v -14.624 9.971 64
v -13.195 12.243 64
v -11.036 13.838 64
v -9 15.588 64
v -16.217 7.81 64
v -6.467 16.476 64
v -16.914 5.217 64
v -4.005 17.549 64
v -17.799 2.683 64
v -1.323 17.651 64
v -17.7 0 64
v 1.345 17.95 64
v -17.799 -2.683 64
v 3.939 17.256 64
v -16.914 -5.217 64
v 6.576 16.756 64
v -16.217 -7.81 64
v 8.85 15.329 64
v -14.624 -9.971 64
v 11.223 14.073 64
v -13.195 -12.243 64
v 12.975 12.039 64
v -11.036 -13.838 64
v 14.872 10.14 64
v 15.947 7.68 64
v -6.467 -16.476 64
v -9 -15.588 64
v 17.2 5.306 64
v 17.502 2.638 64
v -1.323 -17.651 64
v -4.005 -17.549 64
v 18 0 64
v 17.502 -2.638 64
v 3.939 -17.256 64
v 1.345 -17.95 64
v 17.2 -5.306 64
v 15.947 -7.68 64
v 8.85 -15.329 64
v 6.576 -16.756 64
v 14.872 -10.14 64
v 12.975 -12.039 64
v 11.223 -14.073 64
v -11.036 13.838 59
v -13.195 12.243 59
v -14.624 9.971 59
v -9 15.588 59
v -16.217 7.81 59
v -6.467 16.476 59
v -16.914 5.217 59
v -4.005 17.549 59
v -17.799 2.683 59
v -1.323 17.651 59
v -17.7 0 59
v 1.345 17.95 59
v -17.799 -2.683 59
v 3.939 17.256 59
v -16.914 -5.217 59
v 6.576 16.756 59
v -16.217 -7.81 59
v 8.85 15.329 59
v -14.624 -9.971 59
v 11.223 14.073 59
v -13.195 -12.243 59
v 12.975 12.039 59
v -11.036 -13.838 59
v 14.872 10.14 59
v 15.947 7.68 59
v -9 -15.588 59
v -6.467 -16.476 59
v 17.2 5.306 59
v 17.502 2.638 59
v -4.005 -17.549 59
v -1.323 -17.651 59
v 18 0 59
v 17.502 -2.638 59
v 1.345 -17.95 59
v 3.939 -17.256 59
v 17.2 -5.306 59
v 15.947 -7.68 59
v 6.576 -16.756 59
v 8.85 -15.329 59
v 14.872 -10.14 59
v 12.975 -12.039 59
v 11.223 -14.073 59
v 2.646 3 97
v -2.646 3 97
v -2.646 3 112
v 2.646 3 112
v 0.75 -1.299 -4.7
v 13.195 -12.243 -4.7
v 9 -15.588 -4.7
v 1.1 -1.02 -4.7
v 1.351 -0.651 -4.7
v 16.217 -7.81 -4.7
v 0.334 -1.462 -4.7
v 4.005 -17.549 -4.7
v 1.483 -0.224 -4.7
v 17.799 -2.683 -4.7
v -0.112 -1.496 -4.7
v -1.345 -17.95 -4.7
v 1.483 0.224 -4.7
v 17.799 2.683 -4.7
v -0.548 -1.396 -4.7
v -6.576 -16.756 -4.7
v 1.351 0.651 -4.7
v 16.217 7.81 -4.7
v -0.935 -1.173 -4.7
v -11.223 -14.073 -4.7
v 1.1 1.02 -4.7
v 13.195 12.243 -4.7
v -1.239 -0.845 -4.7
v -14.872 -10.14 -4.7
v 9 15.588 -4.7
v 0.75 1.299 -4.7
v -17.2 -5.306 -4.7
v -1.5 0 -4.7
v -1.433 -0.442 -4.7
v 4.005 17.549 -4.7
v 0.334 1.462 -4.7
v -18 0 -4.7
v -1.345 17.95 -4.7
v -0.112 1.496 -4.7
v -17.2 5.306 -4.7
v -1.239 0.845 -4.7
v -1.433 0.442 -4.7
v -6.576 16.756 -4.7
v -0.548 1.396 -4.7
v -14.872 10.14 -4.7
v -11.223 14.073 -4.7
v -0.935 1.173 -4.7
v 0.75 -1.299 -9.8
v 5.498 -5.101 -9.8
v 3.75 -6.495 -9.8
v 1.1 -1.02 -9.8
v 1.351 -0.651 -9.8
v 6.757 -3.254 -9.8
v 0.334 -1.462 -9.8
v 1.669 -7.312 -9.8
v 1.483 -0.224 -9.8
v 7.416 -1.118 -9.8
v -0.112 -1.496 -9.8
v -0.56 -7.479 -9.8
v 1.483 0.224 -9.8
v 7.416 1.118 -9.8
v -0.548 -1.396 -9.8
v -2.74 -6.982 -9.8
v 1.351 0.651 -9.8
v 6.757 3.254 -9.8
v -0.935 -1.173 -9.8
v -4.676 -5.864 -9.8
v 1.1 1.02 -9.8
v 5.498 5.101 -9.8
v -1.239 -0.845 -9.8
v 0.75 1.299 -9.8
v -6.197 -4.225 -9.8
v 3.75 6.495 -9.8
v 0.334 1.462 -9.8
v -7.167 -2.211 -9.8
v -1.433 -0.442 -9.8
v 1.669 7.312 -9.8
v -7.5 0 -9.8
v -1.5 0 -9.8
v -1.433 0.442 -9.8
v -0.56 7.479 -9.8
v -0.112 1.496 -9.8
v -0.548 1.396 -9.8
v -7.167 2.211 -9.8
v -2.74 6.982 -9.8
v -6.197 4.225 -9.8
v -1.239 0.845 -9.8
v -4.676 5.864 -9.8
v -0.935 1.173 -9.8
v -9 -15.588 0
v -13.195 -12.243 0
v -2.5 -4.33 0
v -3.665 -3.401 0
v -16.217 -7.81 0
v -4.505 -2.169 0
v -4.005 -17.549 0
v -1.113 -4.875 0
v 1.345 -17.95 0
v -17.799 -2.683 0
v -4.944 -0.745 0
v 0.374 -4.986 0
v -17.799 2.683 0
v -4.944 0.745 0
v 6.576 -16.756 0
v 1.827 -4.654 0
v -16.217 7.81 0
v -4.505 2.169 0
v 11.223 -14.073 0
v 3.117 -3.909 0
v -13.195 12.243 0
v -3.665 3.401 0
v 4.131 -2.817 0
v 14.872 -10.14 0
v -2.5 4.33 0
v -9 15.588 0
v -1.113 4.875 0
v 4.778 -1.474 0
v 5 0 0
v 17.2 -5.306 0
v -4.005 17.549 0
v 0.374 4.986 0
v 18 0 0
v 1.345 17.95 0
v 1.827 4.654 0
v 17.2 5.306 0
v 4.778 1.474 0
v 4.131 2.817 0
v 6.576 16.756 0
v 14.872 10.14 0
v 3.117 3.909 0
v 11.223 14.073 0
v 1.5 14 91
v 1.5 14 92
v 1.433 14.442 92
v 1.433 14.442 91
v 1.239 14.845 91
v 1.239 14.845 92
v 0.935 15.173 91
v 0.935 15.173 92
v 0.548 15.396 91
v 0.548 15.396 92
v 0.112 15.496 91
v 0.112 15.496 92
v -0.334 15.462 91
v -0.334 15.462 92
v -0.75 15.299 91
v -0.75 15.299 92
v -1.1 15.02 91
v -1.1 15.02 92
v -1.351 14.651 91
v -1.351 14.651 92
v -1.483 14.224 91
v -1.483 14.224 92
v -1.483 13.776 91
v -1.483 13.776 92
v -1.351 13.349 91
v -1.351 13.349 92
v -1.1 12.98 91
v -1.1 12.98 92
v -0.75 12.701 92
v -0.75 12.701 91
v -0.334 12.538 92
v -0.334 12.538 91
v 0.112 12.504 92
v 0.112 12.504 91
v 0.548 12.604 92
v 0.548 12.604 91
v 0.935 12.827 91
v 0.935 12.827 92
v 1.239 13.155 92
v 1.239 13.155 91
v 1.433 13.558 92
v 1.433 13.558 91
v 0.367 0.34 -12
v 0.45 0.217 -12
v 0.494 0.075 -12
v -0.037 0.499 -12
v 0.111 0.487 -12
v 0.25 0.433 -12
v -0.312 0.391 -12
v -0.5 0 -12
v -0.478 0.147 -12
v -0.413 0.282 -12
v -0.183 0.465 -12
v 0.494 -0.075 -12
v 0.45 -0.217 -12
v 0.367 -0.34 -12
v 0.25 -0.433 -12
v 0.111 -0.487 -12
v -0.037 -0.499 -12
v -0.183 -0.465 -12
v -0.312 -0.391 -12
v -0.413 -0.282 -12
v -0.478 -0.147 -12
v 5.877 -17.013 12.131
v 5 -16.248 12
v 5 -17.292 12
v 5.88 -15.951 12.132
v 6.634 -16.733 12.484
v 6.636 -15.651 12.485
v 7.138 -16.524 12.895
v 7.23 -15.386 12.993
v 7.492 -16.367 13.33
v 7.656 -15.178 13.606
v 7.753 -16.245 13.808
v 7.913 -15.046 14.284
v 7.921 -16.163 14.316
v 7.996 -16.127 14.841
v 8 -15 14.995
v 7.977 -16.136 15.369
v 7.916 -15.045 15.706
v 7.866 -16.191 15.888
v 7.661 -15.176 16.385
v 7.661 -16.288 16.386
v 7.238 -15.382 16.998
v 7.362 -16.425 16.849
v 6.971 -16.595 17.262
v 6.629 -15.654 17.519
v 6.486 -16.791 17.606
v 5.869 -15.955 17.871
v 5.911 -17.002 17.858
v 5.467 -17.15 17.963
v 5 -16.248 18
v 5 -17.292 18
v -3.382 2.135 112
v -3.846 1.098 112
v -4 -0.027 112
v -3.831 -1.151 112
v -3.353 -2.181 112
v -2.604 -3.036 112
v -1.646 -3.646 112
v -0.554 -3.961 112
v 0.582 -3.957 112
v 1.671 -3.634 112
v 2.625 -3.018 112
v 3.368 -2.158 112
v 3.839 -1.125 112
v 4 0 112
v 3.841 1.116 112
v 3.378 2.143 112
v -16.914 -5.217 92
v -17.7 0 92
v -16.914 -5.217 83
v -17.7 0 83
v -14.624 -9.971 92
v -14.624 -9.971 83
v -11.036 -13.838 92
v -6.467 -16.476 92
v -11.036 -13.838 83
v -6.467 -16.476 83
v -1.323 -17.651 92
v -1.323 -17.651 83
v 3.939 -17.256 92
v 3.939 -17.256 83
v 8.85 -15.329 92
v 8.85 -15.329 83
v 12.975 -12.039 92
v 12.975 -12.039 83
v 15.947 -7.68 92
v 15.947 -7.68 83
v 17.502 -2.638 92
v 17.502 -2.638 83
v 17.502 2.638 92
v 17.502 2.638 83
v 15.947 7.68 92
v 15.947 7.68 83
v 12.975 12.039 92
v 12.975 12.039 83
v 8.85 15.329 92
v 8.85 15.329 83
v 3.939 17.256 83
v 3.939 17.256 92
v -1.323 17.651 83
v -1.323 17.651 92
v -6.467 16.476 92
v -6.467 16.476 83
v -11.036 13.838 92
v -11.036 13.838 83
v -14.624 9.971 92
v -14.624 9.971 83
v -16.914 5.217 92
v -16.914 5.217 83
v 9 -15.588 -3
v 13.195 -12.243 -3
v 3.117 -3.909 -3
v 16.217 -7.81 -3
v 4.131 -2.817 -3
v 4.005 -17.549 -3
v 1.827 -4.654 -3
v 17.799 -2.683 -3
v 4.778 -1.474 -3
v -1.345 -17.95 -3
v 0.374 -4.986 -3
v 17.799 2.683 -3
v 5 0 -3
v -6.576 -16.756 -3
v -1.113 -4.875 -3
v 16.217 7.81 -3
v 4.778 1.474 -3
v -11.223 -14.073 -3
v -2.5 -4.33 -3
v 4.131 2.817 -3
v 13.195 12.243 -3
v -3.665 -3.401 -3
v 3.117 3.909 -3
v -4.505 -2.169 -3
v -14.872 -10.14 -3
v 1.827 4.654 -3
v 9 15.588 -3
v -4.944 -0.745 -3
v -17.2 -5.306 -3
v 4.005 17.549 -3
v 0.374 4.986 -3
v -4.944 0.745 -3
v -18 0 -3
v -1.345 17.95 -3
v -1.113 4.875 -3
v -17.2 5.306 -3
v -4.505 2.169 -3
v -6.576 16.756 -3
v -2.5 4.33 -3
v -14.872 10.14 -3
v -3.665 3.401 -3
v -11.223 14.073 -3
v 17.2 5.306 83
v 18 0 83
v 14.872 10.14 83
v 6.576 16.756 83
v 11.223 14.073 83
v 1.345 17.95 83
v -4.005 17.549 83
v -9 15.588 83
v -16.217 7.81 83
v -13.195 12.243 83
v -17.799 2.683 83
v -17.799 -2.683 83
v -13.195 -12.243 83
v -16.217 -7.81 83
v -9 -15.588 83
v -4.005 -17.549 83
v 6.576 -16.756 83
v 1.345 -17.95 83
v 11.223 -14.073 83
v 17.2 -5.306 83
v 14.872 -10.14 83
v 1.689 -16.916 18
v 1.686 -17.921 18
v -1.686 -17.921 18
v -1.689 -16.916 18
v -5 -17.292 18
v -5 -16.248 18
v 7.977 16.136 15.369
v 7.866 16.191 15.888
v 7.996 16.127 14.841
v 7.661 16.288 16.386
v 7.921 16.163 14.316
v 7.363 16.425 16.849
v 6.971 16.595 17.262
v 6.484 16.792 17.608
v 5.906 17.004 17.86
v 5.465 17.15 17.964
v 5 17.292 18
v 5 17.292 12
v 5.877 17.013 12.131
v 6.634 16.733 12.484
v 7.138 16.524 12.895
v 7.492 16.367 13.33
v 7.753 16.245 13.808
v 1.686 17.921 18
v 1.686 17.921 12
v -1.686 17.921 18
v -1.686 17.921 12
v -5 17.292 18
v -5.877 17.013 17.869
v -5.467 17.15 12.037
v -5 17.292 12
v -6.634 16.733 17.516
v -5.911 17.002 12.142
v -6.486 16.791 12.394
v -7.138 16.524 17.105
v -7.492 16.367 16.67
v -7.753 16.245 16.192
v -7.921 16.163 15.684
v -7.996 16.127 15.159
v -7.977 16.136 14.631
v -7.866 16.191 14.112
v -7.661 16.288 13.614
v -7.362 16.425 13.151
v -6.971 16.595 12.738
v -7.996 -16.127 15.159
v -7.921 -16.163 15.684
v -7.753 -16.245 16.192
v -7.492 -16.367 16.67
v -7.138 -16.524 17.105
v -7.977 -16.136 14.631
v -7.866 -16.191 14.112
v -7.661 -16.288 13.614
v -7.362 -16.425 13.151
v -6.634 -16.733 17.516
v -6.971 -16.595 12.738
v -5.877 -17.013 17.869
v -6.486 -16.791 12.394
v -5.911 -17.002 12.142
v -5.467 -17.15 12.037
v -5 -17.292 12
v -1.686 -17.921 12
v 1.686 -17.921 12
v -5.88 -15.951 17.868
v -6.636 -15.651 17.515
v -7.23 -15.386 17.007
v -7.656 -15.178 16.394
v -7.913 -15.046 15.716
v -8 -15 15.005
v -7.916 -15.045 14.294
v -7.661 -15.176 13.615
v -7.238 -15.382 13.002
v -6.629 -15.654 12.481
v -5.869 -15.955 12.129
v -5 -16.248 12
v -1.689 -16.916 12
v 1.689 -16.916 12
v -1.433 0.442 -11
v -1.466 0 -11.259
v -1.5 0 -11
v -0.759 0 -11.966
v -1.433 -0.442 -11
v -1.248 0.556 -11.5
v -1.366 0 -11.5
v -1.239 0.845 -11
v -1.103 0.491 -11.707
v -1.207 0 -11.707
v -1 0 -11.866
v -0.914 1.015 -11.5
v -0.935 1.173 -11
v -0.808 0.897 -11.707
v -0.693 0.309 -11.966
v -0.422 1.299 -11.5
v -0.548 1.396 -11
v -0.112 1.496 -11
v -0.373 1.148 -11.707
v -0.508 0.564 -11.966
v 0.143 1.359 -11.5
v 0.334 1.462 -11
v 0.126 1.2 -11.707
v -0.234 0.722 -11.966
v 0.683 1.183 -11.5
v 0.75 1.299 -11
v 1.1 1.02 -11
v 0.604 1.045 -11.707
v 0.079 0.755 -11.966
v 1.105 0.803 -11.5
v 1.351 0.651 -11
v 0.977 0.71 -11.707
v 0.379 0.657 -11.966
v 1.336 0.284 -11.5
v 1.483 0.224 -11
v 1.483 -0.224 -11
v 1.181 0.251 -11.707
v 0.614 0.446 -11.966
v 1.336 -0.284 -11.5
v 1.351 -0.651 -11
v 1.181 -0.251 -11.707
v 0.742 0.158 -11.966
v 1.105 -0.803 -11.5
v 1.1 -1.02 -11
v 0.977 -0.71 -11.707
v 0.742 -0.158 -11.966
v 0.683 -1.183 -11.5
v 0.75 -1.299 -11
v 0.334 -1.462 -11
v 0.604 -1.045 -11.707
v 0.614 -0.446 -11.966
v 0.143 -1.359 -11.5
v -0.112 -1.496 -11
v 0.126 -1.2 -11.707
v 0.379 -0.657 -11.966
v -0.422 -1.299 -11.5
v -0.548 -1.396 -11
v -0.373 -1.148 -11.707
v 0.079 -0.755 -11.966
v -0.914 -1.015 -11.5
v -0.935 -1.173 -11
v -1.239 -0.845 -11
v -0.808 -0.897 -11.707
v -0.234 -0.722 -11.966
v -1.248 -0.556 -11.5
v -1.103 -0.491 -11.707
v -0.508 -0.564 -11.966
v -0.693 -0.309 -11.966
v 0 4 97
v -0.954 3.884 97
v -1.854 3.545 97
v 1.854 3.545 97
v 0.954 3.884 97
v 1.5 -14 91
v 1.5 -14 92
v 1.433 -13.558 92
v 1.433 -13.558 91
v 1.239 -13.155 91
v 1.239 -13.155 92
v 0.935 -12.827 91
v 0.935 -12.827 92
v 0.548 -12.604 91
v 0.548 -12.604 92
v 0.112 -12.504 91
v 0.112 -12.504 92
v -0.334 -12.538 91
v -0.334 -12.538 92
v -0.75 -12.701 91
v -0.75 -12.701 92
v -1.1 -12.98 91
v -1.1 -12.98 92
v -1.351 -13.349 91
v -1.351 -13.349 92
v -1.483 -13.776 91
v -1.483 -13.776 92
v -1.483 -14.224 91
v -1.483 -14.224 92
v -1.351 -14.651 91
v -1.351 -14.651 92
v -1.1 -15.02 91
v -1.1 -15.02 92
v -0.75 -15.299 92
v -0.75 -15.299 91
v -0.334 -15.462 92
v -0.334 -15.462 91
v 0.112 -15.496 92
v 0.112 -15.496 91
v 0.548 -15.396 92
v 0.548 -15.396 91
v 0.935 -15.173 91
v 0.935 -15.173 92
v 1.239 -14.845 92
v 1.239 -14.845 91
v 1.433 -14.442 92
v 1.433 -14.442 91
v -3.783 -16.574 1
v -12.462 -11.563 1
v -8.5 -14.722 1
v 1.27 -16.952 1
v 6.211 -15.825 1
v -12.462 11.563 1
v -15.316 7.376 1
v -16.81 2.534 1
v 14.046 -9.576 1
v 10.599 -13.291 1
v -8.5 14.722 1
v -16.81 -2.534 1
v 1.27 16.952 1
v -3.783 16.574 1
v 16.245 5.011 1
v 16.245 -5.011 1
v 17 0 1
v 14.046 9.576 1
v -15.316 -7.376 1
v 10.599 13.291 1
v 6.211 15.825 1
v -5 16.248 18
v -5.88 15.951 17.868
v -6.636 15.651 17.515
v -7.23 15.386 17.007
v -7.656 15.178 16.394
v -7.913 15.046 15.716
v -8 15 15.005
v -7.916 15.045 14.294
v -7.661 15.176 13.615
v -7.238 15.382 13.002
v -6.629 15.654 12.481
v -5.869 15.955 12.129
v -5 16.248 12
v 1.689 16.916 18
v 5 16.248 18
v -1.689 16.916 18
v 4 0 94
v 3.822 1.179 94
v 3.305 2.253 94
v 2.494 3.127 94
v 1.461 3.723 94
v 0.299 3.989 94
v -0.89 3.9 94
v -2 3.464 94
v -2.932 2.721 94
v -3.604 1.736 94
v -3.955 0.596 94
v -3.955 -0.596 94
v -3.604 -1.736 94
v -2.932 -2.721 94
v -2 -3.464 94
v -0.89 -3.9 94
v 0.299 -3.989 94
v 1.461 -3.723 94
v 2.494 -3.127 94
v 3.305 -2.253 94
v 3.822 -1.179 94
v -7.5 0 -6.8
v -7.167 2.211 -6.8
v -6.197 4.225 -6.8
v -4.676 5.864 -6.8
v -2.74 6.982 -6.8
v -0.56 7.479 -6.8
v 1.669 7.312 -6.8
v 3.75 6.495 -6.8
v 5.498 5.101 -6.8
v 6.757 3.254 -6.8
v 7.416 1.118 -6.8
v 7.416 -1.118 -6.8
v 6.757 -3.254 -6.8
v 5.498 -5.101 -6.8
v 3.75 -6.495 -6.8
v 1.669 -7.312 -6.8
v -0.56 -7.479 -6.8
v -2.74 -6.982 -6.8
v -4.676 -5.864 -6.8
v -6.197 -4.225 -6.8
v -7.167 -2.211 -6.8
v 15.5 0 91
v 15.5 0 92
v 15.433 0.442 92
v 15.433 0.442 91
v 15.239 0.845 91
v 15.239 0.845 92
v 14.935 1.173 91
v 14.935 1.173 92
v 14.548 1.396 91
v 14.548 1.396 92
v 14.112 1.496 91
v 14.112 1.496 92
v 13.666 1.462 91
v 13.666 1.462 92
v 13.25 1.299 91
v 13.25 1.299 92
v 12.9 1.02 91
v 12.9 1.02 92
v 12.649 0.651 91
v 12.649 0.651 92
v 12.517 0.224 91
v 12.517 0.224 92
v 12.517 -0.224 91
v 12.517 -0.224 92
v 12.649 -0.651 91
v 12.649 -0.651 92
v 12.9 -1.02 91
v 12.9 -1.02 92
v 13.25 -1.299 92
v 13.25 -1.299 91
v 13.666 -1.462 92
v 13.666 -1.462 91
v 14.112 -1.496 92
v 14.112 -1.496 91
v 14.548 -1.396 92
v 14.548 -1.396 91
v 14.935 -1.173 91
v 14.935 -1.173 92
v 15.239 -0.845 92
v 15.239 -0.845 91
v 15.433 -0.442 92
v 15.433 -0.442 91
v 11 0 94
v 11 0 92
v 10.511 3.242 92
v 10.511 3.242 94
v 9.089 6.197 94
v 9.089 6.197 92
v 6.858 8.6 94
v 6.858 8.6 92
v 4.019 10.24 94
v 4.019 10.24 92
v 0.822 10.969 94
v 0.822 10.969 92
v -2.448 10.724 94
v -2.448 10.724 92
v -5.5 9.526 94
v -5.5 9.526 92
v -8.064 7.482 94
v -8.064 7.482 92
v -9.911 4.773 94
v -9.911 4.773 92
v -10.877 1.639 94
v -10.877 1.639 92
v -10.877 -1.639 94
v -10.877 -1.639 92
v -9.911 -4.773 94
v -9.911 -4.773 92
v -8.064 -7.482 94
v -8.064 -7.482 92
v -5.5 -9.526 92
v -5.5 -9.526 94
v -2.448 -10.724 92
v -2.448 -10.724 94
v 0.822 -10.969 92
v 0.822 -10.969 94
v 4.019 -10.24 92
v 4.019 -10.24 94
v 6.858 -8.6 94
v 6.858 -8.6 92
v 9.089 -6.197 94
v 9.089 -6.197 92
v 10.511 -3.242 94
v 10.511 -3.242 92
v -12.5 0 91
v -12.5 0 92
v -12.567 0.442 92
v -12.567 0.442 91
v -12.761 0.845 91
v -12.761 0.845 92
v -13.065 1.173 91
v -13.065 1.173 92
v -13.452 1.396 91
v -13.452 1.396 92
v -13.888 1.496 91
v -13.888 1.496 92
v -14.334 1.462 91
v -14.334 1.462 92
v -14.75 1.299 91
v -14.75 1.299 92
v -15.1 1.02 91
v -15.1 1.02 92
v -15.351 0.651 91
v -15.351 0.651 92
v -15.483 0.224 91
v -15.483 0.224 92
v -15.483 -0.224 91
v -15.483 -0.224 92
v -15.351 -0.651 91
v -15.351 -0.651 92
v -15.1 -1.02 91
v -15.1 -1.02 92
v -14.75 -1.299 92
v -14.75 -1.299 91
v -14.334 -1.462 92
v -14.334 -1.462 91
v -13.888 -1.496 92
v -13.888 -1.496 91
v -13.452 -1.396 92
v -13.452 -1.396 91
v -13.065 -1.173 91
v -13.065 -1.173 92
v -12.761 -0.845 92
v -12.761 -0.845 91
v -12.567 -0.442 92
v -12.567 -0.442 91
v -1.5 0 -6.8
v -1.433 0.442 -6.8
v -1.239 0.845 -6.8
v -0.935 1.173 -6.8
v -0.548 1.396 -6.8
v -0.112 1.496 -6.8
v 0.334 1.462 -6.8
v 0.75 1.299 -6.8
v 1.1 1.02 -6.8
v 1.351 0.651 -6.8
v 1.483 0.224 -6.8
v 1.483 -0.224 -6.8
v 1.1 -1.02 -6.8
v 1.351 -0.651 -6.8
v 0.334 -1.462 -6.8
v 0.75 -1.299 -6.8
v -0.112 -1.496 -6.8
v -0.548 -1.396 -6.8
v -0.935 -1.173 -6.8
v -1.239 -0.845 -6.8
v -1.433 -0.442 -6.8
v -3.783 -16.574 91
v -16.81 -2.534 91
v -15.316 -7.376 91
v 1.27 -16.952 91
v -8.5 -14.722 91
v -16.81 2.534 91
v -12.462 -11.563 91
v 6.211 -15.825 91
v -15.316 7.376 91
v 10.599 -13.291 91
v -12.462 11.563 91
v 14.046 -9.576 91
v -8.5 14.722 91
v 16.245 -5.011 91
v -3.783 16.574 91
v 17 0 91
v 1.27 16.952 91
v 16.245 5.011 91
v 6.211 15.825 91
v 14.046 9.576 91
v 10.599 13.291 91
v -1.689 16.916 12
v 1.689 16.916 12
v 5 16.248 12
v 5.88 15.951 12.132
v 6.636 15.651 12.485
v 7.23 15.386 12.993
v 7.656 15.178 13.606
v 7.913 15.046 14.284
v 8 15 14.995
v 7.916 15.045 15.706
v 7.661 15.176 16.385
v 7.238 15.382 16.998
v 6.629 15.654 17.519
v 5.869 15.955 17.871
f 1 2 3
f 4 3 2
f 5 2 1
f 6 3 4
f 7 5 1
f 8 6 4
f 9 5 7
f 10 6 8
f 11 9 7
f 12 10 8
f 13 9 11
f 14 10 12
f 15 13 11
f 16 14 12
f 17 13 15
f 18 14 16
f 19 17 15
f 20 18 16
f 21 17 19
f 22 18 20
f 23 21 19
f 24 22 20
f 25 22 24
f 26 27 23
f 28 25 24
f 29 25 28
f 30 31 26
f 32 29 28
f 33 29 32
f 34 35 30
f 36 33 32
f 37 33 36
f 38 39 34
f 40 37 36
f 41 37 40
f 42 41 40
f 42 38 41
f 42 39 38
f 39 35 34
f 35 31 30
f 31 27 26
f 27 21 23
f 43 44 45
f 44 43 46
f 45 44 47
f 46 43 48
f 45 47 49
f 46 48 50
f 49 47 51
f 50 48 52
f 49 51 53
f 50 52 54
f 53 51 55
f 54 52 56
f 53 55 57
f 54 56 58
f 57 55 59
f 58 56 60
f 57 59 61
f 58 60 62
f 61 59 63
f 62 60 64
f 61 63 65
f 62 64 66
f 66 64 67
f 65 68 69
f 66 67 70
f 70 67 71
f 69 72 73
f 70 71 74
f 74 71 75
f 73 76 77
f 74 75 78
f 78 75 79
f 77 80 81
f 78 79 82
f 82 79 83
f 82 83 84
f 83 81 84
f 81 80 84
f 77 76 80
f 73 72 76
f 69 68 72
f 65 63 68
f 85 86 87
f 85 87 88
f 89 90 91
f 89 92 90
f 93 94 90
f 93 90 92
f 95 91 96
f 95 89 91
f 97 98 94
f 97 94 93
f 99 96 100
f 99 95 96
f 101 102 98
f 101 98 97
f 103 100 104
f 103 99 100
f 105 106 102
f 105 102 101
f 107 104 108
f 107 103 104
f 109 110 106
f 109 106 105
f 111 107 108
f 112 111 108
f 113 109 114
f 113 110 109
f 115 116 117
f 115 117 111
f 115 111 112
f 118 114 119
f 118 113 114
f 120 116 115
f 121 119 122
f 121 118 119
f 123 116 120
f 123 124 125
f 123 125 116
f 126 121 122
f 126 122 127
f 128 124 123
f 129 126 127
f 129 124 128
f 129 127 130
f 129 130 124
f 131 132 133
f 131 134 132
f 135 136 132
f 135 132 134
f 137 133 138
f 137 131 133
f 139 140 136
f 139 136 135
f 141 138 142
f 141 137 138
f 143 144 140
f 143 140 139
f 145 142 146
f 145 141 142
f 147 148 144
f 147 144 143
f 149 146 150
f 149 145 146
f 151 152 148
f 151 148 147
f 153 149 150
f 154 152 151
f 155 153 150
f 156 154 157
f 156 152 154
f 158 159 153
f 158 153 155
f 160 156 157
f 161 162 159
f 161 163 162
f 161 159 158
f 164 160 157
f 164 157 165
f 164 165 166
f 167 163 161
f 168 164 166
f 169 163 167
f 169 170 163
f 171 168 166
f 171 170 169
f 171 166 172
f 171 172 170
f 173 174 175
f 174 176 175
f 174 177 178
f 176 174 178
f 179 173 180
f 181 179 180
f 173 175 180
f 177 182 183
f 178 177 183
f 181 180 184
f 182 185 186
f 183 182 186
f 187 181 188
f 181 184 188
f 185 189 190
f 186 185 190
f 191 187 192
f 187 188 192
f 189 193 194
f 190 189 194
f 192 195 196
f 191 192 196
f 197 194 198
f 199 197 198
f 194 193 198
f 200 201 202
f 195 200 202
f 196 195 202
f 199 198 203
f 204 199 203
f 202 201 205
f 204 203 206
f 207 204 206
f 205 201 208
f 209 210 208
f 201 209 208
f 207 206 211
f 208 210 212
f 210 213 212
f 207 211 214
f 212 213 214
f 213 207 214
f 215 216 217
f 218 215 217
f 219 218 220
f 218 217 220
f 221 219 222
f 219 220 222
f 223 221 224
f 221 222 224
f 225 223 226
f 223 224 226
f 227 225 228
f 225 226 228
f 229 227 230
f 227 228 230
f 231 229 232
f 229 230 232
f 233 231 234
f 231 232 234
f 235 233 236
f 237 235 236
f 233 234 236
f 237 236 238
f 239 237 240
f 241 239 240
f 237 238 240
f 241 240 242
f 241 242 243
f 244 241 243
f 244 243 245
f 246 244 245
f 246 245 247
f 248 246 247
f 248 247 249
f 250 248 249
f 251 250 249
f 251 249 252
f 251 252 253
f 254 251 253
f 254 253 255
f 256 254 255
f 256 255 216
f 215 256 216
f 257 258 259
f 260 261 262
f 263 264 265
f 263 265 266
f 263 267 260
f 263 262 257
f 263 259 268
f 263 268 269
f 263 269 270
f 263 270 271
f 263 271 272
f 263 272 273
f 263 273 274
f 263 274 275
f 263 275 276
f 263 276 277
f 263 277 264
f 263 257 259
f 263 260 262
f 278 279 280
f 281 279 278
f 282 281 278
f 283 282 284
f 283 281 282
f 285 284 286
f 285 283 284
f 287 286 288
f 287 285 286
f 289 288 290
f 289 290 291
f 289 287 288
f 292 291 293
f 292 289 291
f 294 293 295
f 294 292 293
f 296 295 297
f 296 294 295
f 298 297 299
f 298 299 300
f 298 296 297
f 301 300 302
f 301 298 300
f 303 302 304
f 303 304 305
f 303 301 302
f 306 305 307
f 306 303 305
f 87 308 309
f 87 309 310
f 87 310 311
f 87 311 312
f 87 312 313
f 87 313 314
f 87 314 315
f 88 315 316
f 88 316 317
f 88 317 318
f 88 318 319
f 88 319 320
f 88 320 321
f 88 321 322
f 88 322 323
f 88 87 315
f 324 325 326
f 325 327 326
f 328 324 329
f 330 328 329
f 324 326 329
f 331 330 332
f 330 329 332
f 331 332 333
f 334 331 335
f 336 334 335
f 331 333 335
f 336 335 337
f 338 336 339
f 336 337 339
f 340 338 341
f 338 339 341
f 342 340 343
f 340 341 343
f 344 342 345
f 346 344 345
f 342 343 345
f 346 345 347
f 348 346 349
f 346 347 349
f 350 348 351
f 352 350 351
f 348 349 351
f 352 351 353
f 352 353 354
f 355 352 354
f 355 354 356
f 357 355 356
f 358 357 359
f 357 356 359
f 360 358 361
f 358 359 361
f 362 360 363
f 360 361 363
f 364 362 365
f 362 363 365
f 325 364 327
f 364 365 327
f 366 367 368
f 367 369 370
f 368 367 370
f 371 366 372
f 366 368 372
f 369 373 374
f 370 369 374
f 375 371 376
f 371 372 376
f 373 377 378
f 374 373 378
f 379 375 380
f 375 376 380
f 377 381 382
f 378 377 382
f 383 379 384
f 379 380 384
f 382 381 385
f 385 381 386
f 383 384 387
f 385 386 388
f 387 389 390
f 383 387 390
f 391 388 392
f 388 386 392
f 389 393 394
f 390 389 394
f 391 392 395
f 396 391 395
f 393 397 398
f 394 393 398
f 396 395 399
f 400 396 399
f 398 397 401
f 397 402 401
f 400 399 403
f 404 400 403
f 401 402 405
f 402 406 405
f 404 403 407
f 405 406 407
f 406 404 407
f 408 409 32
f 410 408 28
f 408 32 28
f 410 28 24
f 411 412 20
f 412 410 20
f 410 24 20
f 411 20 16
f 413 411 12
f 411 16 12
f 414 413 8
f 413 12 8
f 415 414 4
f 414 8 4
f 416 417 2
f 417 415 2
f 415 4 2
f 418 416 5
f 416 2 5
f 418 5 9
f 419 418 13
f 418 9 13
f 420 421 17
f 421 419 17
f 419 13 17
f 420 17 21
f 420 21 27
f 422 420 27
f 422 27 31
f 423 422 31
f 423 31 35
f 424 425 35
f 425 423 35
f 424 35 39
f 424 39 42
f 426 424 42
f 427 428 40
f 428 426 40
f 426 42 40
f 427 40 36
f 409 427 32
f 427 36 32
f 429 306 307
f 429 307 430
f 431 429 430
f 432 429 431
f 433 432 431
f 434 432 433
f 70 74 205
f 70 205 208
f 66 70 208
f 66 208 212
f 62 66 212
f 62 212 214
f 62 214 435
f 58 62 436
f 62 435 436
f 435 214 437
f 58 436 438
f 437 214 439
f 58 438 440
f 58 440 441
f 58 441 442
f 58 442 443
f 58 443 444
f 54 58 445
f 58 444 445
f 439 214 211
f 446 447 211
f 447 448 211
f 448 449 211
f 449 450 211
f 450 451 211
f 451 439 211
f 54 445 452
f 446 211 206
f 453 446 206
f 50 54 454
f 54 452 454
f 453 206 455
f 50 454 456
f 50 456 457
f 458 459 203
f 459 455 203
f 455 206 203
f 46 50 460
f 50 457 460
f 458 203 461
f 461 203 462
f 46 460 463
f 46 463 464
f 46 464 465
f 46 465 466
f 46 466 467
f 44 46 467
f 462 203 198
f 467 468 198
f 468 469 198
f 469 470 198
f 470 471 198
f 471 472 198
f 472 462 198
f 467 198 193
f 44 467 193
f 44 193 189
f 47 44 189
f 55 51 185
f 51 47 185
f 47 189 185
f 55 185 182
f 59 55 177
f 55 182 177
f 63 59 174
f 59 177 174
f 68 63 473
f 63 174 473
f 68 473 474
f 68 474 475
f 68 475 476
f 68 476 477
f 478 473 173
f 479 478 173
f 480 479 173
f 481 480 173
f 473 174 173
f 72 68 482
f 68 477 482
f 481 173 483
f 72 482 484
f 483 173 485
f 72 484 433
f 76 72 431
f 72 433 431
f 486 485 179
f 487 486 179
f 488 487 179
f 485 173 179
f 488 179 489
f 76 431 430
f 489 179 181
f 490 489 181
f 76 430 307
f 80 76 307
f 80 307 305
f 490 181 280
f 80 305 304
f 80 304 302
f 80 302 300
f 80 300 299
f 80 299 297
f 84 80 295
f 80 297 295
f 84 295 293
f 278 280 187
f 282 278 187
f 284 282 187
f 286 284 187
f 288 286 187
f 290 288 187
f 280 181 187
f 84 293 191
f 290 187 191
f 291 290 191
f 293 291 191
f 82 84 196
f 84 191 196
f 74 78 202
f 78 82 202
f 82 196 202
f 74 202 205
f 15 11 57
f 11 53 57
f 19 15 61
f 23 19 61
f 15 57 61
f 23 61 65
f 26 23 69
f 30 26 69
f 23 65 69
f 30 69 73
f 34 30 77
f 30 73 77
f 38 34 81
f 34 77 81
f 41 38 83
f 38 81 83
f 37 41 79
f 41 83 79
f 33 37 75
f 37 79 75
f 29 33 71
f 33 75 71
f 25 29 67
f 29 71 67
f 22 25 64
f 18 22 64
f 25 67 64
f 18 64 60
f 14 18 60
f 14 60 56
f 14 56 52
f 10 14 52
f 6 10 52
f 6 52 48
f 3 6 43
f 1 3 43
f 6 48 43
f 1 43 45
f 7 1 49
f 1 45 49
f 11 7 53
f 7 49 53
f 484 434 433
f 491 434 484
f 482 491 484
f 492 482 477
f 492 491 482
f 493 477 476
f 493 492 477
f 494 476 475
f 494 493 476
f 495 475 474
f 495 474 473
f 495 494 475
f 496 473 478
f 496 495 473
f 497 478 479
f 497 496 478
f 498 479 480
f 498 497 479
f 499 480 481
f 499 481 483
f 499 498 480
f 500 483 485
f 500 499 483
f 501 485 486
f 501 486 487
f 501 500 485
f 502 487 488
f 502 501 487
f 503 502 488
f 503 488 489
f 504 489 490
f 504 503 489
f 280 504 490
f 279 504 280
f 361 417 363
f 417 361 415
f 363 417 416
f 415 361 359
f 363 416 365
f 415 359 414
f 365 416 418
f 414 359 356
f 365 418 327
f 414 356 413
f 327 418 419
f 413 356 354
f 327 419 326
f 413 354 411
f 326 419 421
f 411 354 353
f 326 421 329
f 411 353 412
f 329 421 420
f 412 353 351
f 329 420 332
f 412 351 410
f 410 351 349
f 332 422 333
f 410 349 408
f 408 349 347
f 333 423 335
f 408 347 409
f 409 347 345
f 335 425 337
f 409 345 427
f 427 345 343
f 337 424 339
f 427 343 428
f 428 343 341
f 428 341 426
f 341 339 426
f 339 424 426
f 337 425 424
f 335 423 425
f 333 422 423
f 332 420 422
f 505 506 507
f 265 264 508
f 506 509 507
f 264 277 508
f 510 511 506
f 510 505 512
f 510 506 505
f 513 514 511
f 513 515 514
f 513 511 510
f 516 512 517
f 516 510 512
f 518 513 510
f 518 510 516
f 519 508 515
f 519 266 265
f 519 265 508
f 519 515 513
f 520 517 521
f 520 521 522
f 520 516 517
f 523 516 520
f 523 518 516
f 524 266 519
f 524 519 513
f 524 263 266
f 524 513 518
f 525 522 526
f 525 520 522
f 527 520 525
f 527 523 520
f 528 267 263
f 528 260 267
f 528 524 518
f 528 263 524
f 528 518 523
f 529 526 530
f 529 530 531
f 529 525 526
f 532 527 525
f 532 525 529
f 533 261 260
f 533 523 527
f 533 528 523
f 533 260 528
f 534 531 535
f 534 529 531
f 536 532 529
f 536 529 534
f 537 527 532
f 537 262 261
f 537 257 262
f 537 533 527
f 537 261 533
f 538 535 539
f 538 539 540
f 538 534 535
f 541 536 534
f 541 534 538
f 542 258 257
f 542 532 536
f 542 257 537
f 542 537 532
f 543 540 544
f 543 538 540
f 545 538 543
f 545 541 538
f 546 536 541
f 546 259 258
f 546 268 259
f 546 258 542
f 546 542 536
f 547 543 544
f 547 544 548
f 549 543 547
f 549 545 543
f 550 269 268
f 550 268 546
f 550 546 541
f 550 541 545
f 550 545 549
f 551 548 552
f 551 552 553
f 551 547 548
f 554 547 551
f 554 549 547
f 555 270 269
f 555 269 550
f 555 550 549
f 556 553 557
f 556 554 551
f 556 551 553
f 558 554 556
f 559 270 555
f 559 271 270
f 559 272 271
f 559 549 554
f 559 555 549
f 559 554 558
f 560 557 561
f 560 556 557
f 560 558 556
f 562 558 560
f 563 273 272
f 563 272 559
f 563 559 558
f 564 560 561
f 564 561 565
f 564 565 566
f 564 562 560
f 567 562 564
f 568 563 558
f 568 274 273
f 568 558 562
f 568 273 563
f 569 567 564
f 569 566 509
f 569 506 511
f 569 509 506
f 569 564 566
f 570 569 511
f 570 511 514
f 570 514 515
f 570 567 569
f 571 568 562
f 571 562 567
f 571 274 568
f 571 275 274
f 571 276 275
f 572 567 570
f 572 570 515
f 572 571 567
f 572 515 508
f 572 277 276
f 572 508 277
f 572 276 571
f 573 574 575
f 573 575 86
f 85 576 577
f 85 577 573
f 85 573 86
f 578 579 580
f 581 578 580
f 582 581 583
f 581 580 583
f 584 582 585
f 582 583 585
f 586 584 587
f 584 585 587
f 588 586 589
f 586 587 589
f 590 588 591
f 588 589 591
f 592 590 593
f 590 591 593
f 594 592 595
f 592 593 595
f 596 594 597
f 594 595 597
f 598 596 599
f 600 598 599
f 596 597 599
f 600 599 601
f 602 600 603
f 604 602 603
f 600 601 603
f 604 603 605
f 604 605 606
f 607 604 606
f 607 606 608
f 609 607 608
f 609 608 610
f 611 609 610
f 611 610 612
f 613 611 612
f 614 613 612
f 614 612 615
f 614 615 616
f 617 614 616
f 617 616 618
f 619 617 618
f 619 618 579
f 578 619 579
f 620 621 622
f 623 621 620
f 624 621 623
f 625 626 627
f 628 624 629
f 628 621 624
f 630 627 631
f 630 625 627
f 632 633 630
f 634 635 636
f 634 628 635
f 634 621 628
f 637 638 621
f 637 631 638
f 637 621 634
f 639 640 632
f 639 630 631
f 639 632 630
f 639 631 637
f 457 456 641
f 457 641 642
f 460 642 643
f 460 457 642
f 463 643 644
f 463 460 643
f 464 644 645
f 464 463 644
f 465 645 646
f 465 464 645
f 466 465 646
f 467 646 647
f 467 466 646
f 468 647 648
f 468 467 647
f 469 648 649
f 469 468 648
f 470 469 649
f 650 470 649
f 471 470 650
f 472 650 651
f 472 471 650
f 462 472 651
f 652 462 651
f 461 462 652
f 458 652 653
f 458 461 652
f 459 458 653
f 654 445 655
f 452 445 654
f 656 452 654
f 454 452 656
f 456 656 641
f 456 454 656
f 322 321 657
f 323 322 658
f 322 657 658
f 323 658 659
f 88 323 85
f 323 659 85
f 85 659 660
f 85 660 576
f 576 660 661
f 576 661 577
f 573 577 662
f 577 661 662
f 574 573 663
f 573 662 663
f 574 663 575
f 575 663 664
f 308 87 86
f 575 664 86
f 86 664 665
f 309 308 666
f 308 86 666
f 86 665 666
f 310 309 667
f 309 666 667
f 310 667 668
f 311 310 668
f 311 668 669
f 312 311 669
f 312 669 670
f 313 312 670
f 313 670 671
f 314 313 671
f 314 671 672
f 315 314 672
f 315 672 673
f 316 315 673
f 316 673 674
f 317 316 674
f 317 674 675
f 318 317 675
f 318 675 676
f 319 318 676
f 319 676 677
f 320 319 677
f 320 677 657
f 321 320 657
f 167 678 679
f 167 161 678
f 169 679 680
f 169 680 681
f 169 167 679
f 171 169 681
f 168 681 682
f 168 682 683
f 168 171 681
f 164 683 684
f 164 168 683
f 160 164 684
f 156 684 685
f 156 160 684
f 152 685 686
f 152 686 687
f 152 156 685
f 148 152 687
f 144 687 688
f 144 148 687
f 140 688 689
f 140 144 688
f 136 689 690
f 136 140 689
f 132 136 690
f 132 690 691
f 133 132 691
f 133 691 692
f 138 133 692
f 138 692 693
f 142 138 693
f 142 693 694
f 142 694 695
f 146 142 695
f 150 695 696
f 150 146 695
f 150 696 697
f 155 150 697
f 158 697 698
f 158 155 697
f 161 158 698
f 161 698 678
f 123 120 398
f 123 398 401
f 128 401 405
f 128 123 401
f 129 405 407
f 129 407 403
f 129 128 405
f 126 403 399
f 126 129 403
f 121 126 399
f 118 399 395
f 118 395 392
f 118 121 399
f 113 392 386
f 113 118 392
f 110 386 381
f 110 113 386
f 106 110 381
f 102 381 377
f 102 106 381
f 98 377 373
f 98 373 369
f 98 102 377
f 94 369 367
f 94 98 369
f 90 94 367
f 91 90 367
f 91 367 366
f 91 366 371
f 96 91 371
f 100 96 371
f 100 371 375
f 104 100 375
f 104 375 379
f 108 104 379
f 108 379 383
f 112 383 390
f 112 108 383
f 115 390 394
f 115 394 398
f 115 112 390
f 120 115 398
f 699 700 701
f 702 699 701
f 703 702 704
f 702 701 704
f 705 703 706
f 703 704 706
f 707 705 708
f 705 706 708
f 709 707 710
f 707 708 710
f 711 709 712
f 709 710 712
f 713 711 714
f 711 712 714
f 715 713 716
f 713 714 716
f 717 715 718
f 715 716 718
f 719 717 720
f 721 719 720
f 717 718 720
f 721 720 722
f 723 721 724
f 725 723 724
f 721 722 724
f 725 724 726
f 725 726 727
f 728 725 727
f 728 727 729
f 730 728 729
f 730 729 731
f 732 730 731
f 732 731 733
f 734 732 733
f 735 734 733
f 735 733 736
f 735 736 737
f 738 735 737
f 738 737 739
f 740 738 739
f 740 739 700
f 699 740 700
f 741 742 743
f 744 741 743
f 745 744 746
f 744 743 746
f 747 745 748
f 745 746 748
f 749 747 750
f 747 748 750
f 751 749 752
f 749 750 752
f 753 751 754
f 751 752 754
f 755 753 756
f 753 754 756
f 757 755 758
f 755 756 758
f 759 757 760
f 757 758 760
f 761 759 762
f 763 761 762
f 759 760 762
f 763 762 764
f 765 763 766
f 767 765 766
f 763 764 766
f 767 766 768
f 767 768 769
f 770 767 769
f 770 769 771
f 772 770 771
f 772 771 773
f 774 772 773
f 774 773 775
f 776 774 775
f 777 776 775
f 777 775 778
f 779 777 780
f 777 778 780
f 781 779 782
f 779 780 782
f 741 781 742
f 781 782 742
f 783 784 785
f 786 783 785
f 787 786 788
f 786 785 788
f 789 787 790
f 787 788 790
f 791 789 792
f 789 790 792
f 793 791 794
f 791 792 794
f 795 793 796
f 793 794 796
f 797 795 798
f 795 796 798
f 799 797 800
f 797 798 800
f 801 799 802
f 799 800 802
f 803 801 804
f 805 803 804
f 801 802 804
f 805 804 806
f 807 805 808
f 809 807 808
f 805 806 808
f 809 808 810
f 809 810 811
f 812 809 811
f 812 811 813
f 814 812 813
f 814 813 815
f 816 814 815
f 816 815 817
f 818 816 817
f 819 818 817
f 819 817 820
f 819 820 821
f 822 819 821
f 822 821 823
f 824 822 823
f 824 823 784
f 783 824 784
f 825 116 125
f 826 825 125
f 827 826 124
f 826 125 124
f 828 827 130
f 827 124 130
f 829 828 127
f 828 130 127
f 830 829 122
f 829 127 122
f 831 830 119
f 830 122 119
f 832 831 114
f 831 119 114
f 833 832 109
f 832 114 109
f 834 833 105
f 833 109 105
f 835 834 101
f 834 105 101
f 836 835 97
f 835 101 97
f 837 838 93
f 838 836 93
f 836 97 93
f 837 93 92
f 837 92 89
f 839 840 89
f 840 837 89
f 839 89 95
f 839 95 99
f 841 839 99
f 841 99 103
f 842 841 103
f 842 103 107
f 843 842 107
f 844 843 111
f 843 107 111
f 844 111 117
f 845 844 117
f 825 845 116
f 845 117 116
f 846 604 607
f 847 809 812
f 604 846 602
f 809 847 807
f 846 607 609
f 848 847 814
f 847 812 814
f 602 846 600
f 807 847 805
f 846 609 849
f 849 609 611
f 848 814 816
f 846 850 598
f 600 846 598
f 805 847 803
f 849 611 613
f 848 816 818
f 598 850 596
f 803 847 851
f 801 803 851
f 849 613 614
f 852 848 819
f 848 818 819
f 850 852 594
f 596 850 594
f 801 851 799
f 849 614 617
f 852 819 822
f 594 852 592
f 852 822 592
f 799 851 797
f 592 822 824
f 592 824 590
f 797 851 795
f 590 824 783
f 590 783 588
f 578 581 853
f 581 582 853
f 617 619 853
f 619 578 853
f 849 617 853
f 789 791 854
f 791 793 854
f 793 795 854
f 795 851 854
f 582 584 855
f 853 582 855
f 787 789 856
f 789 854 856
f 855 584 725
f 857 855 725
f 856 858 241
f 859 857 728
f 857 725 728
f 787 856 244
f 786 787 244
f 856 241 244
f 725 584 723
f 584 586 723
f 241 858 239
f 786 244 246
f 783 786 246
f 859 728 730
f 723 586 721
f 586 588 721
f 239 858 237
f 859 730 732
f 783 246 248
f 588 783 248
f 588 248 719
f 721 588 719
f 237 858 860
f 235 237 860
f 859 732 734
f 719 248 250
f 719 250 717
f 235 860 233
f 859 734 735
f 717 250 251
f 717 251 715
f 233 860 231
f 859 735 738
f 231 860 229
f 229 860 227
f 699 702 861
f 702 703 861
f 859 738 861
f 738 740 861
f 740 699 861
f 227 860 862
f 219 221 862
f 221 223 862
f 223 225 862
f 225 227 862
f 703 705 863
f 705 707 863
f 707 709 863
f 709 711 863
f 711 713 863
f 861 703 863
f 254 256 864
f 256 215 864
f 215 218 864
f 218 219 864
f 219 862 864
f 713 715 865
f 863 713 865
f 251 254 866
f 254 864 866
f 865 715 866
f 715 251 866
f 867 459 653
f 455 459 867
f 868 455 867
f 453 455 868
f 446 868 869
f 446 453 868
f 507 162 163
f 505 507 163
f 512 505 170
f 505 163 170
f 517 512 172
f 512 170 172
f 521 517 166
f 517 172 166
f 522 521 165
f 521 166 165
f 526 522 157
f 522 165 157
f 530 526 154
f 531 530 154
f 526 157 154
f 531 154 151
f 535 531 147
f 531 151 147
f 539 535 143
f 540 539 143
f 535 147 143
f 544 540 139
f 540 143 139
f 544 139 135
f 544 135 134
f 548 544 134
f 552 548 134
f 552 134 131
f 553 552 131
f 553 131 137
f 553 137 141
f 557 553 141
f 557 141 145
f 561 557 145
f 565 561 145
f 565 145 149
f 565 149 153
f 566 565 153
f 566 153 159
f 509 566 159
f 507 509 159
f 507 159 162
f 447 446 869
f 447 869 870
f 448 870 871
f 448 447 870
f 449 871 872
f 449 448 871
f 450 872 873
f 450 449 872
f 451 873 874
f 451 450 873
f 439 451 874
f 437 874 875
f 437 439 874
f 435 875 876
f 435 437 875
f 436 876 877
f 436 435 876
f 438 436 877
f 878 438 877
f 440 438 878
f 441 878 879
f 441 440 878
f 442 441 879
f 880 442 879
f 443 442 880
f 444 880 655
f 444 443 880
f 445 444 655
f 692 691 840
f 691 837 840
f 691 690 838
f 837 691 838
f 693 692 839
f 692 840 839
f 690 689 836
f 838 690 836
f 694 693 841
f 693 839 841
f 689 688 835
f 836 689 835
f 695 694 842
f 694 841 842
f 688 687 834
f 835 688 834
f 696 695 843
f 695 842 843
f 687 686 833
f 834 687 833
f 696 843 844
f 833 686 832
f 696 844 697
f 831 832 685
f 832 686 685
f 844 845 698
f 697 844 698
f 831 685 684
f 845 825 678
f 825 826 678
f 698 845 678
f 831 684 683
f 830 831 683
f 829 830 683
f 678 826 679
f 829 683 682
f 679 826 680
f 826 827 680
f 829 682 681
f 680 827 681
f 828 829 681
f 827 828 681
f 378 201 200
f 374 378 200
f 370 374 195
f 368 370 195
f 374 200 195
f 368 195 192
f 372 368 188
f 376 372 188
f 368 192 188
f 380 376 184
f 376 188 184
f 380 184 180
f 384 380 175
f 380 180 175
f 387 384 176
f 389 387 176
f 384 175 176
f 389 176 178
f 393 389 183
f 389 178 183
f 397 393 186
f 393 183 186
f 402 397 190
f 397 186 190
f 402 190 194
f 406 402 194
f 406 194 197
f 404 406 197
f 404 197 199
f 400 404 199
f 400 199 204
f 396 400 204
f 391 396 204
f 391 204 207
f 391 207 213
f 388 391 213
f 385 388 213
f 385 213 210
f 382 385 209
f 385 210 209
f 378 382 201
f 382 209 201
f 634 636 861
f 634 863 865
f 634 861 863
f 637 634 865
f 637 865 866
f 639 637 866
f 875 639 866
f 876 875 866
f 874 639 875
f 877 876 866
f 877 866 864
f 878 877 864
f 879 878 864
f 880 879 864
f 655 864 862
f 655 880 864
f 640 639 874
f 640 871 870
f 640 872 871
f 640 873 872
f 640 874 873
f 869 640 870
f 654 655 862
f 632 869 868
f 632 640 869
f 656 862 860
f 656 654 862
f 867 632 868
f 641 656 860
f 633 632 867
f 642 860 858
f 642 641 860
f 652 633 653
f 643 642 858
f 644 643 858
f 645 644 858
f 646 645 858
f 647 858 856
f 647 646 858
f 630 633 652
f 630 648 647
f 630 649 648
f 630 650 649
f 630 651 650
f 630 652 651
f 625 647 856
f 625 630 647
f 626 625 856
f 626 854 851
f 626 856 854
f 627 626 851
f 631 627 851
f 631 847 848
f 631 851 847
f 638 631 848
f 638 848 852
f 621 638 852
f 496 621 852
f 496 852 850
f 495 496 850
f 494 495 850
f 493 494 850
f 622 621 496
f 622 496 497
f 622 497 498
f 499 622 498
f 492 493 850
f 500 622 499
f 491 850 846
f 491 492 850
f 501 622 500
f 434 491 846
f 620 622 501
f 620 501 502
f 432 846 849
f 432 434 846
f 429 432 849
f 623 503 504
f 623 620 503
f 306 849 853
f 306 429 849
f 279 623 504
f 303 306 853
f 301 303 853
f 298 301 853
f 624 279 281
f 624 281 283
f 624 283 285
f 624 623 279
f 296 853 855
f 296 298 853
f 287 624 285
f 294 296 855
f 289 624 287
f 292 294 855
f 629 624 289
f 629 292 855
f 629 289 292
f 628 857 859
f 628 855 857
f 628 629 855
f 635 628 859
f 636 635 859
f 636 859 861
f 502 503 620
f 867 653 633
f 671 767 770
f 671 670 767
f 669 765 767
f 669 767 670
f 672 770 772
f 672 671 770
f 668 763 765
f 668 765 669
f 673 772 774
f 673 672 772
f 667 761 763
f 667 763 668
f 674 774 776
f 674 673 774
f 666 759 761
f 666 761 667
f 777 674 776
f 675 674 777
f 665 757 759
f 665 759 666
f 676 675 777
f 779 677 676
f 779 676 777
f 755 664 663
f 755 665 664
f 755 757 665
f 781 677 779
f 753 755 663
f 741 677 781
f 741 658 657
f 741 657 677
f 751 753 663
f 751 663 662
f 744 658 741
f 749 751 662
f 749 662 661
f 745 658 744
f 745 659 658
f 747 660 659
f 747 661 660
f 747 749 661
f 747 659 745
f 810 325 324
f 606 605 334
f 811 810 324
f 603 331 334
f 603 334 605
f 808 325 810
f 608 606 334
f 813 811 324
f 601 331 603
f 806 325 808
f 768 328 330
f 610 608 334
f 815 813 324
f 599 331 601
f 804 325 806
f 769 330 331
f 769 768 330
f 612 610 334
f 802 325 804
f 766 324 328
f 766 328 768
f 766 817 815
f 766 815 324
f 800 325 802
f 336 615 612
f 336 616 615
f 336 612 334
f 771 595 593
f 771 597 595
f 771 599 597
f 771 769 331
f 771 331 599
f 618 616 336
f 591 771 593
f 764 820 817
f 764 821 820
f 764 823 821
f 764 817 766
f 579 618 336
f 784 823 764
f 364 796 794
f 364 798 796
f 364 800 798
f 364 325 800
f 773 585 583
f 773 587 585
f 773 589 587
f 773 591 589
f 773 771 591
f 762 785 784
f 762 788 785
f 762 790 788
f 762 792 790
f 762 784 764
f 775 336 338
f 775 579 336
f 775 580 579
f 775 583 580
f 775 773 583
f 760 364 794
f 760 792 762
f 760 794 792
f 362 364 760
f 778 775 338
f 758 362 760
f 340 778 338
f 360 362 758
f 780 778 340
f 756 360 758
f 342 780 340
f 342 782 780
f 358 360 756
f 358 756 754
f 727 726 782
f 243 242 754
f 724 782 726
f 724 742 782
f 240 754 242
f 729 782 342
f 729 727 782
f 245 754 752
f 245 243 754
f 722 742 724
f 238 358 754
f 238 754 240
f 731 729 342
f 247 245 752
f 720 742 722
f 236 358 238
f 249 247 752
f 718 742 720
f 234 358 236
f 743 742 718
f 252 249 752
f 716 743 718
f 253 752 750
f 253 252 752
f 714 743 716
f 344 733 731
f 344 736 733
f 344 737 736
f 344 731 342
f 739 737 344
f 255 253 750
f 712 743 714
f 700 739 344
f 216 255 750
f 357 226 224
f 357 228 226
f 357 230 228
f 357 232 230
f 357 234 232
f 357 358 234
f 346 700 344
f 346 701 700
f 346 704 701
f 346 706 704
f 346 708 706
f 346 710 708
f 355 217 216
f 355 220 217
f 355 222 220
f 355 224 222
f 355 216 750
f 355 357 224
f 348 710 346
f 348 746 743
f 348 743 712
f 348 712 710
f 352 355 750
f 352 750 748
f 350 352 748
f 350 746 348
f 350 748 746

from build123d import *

# Parameters (mm, degrees)
SKETCH_1_R          = 18
EXTRUDE_1_DEPTH     = 92
CUT_EXTRUDE_2_DEPTH = 36
SHELL_8_T           = -1
SKETCH_2_R          = 11
EXTRUDE_2_DEPTH     = 2
SKETCH_3_R          = 4
EXTRUDE_3_DEPTH     = 18
CUT_EXTRUDE_START   = -15
CUT_EXTRUDE_1_DEPTH = 15
SKETCH_5_R          = 5
EXTRUDE_4_DEPTH     = 3
SKETCH_6_R          = 1.5
EXTRUDE_5_DEPTH     = 9
FILLET_1_R          = 1
SKETCH_8_R          = 1.5
CUT_EXTRUDE_3_DEPTH = 5
SKETCH_9_W          = 0.3
SKETCH_9_H          = 9
SKETCH_9_H_2        = 5
EXTRUDE_START       = 1.7
SKETCH_10_R         = 18
EXTRUDE_6_DEPTH     = 1.7
SKETCH_12_R         = 7.5
EXTRUDE_7_DEPTH     = 1.5


with BuildPart() as part:
    # 草图1 → 凸台-拉伸1 (new body)
    with BuildSketch(Plane.XY):
        Circle(SKETCH_1_R)
    extrude(amount=EXTRUDE_1_DEPTH)

    # 草图7 → 切除-拉伸2 (cut)
    with BuildSketch(Plane(origin=(0, 18, 0), x_dir=(1, 0, 0), z_dir=(0, 1, 0))):
        with BuildLine():
            Line((5, -18), (-5, -18))
            ThreePointArc((-5, -18), (-8, -15), (-5, -12))
            Line((-5, -12), (5, -12))
            ThreePointArc((5, -12), (8, -15), (5, -18))
        make_face()
    extrude(amount=-CUT_EXTRUDE_2_DEPTH, mode=Mode.SUBTRACT)

    # 抽壳8
    shell_8_openings = [part.faces().sort_by_distance(p)[0] for p in [
        (8, 0, 15),
        (0, 0, 18),
        (-8, 0, 15),
        (0, 0, 12),
    ]]
    offset(amount=SHELL_8_T, openings=shell_8_openings)

    # 草图2 → 凸台-拉伸2 (add)
    with BuildSketch(Plane.XY.offset(92)):
        Circle(SKETCH_2_R)
    extrude(amount=EXTRUDE_2_DEPTH)

    # 草图3 → 凸台-拉伸3 (add)
    with BuildSketch(Plane.XY.offset(94)):
        Circle(SKETCH_3_R)
    extrude(amount=EXTRUDE_3_DEPTH)

    # 草图4 → 切除-拉伸1 (cut)
    with BuildSketch(Plane.XY.offset(112).offset(CUT_EXTRUDE_START)):
        with BuildLine():
            ThreePointArc((2.645751311, 3), (1.414213562, 3.741657387), (0, 4))
            Line((0, 4), (0, 3))
            Line((0, 3), (2.645751311, 3))
        make_face()
        with BuildLine():
            Line((0, 3), (0, 4))
            ThreePointArc((0, 4), (-1.414213562, 3.741657387), (-2.645751311, 3))
            Line((-2.645751311, 3), (0, 3))
        make_face()
    extrude(amount=CUT_EXTRUDE_1_DEPTH, mode=Mode.SUBTRACT)

    # 草图5 → 凸台-拉伸4 (add)
    with BuildSketch(Plane(origin=(0, 0, 0), x_dir=(-1, 0, 0), z_dir=(0, 0, -1))):
        with Locations(Location((0, 0, 0), (0, 0, 180))):
            Circle(SKETCH_5_R)
    extrude(amount=EXTRUDE_4_DEPTH)

    # 草图6 → 凸台-拉伸5 (add)
    with BuildSketch(Plane(origin=(0, 0, -3), x_dir=(-1, 0, 0), z_dir=(0, 0, -1))):
        Circle(SKETCH_6_R)
    extrude(amount=EXTRUDE_5_DEPTH)

    # 圆角1
    fillet_1_edges = [part.edges().sort_by_distance(p)[0] for p in [
        (1.5, 0, -12),
    ]]
    fillet(fillet_1_edges, radius=FILLET_1_R)

    # 草图8 → 切除-拉伸3 (cut)
    with BuildSketch(Plane.XY.offset(92)):
        with Locations((14, 0)):
            Circle(SKETCH_8_R)
        with Locations((0, -14)):
            Circle(SKETCH_8_R)
        with Locations((-14, 0)):
            Circle(SKETCH_8_R)
        with Locations((0, 14)):
            Circle(SKETCH_8_R)
    extrude(amount=-CUT_EXTRUDE_3_DEPTH, mode=Mode.SUBTRACT)

    # 草图9 → 切除-旋转1 (revolve, cut)
    with BuildSketch(Plane(origin=(0, 0, 0), x_dir=(1, 0, 0), z_dir=(0, 1, 0)), mode=Mode.PRIVATE) as cut_revolve_1_sk:
        with Locations((17.85, -87.5)):
            Rectangle(SKETCH_9_W, SKETCH_9_H)
        with Locations((17.85, -61.5)):
            Rectangle(SKETCH_9_W, SKETCH_9_H_2)
    revolve(cut_revolve_1_sk.sketch.rotate(Axis((0, 0, 0), (0, 0, 1)), 180), axis=Axis((0, 0, 0), (0, 0, 1)), mode=Mode.SUBTRACT)

    # 草图10 → 凸台-拉伸6 (add)
    with BuildSketch(Plane(origin=(0, 0, -3), x_dir=(-1, 0, 0), z_dir=(0, 0, -1)).offset(EXTRUDE_START)):
        Circle(SKETCH_10_R)
    extrude(amount=-EXTRUDE_6_DEPTH)

    # 草图12 → 凸台-拉伸7 (add, symmetric)
    with BuildSketch(Plane(origin=(0, 0, -8.3), x_dir=(-1, 0, 0), z_dir=(0, 0, -1))):
        Circle(SKETCH_12_R)
    extrude(amount=EXTRUDE_7_DEPTH, both=True)


solid = part.part
